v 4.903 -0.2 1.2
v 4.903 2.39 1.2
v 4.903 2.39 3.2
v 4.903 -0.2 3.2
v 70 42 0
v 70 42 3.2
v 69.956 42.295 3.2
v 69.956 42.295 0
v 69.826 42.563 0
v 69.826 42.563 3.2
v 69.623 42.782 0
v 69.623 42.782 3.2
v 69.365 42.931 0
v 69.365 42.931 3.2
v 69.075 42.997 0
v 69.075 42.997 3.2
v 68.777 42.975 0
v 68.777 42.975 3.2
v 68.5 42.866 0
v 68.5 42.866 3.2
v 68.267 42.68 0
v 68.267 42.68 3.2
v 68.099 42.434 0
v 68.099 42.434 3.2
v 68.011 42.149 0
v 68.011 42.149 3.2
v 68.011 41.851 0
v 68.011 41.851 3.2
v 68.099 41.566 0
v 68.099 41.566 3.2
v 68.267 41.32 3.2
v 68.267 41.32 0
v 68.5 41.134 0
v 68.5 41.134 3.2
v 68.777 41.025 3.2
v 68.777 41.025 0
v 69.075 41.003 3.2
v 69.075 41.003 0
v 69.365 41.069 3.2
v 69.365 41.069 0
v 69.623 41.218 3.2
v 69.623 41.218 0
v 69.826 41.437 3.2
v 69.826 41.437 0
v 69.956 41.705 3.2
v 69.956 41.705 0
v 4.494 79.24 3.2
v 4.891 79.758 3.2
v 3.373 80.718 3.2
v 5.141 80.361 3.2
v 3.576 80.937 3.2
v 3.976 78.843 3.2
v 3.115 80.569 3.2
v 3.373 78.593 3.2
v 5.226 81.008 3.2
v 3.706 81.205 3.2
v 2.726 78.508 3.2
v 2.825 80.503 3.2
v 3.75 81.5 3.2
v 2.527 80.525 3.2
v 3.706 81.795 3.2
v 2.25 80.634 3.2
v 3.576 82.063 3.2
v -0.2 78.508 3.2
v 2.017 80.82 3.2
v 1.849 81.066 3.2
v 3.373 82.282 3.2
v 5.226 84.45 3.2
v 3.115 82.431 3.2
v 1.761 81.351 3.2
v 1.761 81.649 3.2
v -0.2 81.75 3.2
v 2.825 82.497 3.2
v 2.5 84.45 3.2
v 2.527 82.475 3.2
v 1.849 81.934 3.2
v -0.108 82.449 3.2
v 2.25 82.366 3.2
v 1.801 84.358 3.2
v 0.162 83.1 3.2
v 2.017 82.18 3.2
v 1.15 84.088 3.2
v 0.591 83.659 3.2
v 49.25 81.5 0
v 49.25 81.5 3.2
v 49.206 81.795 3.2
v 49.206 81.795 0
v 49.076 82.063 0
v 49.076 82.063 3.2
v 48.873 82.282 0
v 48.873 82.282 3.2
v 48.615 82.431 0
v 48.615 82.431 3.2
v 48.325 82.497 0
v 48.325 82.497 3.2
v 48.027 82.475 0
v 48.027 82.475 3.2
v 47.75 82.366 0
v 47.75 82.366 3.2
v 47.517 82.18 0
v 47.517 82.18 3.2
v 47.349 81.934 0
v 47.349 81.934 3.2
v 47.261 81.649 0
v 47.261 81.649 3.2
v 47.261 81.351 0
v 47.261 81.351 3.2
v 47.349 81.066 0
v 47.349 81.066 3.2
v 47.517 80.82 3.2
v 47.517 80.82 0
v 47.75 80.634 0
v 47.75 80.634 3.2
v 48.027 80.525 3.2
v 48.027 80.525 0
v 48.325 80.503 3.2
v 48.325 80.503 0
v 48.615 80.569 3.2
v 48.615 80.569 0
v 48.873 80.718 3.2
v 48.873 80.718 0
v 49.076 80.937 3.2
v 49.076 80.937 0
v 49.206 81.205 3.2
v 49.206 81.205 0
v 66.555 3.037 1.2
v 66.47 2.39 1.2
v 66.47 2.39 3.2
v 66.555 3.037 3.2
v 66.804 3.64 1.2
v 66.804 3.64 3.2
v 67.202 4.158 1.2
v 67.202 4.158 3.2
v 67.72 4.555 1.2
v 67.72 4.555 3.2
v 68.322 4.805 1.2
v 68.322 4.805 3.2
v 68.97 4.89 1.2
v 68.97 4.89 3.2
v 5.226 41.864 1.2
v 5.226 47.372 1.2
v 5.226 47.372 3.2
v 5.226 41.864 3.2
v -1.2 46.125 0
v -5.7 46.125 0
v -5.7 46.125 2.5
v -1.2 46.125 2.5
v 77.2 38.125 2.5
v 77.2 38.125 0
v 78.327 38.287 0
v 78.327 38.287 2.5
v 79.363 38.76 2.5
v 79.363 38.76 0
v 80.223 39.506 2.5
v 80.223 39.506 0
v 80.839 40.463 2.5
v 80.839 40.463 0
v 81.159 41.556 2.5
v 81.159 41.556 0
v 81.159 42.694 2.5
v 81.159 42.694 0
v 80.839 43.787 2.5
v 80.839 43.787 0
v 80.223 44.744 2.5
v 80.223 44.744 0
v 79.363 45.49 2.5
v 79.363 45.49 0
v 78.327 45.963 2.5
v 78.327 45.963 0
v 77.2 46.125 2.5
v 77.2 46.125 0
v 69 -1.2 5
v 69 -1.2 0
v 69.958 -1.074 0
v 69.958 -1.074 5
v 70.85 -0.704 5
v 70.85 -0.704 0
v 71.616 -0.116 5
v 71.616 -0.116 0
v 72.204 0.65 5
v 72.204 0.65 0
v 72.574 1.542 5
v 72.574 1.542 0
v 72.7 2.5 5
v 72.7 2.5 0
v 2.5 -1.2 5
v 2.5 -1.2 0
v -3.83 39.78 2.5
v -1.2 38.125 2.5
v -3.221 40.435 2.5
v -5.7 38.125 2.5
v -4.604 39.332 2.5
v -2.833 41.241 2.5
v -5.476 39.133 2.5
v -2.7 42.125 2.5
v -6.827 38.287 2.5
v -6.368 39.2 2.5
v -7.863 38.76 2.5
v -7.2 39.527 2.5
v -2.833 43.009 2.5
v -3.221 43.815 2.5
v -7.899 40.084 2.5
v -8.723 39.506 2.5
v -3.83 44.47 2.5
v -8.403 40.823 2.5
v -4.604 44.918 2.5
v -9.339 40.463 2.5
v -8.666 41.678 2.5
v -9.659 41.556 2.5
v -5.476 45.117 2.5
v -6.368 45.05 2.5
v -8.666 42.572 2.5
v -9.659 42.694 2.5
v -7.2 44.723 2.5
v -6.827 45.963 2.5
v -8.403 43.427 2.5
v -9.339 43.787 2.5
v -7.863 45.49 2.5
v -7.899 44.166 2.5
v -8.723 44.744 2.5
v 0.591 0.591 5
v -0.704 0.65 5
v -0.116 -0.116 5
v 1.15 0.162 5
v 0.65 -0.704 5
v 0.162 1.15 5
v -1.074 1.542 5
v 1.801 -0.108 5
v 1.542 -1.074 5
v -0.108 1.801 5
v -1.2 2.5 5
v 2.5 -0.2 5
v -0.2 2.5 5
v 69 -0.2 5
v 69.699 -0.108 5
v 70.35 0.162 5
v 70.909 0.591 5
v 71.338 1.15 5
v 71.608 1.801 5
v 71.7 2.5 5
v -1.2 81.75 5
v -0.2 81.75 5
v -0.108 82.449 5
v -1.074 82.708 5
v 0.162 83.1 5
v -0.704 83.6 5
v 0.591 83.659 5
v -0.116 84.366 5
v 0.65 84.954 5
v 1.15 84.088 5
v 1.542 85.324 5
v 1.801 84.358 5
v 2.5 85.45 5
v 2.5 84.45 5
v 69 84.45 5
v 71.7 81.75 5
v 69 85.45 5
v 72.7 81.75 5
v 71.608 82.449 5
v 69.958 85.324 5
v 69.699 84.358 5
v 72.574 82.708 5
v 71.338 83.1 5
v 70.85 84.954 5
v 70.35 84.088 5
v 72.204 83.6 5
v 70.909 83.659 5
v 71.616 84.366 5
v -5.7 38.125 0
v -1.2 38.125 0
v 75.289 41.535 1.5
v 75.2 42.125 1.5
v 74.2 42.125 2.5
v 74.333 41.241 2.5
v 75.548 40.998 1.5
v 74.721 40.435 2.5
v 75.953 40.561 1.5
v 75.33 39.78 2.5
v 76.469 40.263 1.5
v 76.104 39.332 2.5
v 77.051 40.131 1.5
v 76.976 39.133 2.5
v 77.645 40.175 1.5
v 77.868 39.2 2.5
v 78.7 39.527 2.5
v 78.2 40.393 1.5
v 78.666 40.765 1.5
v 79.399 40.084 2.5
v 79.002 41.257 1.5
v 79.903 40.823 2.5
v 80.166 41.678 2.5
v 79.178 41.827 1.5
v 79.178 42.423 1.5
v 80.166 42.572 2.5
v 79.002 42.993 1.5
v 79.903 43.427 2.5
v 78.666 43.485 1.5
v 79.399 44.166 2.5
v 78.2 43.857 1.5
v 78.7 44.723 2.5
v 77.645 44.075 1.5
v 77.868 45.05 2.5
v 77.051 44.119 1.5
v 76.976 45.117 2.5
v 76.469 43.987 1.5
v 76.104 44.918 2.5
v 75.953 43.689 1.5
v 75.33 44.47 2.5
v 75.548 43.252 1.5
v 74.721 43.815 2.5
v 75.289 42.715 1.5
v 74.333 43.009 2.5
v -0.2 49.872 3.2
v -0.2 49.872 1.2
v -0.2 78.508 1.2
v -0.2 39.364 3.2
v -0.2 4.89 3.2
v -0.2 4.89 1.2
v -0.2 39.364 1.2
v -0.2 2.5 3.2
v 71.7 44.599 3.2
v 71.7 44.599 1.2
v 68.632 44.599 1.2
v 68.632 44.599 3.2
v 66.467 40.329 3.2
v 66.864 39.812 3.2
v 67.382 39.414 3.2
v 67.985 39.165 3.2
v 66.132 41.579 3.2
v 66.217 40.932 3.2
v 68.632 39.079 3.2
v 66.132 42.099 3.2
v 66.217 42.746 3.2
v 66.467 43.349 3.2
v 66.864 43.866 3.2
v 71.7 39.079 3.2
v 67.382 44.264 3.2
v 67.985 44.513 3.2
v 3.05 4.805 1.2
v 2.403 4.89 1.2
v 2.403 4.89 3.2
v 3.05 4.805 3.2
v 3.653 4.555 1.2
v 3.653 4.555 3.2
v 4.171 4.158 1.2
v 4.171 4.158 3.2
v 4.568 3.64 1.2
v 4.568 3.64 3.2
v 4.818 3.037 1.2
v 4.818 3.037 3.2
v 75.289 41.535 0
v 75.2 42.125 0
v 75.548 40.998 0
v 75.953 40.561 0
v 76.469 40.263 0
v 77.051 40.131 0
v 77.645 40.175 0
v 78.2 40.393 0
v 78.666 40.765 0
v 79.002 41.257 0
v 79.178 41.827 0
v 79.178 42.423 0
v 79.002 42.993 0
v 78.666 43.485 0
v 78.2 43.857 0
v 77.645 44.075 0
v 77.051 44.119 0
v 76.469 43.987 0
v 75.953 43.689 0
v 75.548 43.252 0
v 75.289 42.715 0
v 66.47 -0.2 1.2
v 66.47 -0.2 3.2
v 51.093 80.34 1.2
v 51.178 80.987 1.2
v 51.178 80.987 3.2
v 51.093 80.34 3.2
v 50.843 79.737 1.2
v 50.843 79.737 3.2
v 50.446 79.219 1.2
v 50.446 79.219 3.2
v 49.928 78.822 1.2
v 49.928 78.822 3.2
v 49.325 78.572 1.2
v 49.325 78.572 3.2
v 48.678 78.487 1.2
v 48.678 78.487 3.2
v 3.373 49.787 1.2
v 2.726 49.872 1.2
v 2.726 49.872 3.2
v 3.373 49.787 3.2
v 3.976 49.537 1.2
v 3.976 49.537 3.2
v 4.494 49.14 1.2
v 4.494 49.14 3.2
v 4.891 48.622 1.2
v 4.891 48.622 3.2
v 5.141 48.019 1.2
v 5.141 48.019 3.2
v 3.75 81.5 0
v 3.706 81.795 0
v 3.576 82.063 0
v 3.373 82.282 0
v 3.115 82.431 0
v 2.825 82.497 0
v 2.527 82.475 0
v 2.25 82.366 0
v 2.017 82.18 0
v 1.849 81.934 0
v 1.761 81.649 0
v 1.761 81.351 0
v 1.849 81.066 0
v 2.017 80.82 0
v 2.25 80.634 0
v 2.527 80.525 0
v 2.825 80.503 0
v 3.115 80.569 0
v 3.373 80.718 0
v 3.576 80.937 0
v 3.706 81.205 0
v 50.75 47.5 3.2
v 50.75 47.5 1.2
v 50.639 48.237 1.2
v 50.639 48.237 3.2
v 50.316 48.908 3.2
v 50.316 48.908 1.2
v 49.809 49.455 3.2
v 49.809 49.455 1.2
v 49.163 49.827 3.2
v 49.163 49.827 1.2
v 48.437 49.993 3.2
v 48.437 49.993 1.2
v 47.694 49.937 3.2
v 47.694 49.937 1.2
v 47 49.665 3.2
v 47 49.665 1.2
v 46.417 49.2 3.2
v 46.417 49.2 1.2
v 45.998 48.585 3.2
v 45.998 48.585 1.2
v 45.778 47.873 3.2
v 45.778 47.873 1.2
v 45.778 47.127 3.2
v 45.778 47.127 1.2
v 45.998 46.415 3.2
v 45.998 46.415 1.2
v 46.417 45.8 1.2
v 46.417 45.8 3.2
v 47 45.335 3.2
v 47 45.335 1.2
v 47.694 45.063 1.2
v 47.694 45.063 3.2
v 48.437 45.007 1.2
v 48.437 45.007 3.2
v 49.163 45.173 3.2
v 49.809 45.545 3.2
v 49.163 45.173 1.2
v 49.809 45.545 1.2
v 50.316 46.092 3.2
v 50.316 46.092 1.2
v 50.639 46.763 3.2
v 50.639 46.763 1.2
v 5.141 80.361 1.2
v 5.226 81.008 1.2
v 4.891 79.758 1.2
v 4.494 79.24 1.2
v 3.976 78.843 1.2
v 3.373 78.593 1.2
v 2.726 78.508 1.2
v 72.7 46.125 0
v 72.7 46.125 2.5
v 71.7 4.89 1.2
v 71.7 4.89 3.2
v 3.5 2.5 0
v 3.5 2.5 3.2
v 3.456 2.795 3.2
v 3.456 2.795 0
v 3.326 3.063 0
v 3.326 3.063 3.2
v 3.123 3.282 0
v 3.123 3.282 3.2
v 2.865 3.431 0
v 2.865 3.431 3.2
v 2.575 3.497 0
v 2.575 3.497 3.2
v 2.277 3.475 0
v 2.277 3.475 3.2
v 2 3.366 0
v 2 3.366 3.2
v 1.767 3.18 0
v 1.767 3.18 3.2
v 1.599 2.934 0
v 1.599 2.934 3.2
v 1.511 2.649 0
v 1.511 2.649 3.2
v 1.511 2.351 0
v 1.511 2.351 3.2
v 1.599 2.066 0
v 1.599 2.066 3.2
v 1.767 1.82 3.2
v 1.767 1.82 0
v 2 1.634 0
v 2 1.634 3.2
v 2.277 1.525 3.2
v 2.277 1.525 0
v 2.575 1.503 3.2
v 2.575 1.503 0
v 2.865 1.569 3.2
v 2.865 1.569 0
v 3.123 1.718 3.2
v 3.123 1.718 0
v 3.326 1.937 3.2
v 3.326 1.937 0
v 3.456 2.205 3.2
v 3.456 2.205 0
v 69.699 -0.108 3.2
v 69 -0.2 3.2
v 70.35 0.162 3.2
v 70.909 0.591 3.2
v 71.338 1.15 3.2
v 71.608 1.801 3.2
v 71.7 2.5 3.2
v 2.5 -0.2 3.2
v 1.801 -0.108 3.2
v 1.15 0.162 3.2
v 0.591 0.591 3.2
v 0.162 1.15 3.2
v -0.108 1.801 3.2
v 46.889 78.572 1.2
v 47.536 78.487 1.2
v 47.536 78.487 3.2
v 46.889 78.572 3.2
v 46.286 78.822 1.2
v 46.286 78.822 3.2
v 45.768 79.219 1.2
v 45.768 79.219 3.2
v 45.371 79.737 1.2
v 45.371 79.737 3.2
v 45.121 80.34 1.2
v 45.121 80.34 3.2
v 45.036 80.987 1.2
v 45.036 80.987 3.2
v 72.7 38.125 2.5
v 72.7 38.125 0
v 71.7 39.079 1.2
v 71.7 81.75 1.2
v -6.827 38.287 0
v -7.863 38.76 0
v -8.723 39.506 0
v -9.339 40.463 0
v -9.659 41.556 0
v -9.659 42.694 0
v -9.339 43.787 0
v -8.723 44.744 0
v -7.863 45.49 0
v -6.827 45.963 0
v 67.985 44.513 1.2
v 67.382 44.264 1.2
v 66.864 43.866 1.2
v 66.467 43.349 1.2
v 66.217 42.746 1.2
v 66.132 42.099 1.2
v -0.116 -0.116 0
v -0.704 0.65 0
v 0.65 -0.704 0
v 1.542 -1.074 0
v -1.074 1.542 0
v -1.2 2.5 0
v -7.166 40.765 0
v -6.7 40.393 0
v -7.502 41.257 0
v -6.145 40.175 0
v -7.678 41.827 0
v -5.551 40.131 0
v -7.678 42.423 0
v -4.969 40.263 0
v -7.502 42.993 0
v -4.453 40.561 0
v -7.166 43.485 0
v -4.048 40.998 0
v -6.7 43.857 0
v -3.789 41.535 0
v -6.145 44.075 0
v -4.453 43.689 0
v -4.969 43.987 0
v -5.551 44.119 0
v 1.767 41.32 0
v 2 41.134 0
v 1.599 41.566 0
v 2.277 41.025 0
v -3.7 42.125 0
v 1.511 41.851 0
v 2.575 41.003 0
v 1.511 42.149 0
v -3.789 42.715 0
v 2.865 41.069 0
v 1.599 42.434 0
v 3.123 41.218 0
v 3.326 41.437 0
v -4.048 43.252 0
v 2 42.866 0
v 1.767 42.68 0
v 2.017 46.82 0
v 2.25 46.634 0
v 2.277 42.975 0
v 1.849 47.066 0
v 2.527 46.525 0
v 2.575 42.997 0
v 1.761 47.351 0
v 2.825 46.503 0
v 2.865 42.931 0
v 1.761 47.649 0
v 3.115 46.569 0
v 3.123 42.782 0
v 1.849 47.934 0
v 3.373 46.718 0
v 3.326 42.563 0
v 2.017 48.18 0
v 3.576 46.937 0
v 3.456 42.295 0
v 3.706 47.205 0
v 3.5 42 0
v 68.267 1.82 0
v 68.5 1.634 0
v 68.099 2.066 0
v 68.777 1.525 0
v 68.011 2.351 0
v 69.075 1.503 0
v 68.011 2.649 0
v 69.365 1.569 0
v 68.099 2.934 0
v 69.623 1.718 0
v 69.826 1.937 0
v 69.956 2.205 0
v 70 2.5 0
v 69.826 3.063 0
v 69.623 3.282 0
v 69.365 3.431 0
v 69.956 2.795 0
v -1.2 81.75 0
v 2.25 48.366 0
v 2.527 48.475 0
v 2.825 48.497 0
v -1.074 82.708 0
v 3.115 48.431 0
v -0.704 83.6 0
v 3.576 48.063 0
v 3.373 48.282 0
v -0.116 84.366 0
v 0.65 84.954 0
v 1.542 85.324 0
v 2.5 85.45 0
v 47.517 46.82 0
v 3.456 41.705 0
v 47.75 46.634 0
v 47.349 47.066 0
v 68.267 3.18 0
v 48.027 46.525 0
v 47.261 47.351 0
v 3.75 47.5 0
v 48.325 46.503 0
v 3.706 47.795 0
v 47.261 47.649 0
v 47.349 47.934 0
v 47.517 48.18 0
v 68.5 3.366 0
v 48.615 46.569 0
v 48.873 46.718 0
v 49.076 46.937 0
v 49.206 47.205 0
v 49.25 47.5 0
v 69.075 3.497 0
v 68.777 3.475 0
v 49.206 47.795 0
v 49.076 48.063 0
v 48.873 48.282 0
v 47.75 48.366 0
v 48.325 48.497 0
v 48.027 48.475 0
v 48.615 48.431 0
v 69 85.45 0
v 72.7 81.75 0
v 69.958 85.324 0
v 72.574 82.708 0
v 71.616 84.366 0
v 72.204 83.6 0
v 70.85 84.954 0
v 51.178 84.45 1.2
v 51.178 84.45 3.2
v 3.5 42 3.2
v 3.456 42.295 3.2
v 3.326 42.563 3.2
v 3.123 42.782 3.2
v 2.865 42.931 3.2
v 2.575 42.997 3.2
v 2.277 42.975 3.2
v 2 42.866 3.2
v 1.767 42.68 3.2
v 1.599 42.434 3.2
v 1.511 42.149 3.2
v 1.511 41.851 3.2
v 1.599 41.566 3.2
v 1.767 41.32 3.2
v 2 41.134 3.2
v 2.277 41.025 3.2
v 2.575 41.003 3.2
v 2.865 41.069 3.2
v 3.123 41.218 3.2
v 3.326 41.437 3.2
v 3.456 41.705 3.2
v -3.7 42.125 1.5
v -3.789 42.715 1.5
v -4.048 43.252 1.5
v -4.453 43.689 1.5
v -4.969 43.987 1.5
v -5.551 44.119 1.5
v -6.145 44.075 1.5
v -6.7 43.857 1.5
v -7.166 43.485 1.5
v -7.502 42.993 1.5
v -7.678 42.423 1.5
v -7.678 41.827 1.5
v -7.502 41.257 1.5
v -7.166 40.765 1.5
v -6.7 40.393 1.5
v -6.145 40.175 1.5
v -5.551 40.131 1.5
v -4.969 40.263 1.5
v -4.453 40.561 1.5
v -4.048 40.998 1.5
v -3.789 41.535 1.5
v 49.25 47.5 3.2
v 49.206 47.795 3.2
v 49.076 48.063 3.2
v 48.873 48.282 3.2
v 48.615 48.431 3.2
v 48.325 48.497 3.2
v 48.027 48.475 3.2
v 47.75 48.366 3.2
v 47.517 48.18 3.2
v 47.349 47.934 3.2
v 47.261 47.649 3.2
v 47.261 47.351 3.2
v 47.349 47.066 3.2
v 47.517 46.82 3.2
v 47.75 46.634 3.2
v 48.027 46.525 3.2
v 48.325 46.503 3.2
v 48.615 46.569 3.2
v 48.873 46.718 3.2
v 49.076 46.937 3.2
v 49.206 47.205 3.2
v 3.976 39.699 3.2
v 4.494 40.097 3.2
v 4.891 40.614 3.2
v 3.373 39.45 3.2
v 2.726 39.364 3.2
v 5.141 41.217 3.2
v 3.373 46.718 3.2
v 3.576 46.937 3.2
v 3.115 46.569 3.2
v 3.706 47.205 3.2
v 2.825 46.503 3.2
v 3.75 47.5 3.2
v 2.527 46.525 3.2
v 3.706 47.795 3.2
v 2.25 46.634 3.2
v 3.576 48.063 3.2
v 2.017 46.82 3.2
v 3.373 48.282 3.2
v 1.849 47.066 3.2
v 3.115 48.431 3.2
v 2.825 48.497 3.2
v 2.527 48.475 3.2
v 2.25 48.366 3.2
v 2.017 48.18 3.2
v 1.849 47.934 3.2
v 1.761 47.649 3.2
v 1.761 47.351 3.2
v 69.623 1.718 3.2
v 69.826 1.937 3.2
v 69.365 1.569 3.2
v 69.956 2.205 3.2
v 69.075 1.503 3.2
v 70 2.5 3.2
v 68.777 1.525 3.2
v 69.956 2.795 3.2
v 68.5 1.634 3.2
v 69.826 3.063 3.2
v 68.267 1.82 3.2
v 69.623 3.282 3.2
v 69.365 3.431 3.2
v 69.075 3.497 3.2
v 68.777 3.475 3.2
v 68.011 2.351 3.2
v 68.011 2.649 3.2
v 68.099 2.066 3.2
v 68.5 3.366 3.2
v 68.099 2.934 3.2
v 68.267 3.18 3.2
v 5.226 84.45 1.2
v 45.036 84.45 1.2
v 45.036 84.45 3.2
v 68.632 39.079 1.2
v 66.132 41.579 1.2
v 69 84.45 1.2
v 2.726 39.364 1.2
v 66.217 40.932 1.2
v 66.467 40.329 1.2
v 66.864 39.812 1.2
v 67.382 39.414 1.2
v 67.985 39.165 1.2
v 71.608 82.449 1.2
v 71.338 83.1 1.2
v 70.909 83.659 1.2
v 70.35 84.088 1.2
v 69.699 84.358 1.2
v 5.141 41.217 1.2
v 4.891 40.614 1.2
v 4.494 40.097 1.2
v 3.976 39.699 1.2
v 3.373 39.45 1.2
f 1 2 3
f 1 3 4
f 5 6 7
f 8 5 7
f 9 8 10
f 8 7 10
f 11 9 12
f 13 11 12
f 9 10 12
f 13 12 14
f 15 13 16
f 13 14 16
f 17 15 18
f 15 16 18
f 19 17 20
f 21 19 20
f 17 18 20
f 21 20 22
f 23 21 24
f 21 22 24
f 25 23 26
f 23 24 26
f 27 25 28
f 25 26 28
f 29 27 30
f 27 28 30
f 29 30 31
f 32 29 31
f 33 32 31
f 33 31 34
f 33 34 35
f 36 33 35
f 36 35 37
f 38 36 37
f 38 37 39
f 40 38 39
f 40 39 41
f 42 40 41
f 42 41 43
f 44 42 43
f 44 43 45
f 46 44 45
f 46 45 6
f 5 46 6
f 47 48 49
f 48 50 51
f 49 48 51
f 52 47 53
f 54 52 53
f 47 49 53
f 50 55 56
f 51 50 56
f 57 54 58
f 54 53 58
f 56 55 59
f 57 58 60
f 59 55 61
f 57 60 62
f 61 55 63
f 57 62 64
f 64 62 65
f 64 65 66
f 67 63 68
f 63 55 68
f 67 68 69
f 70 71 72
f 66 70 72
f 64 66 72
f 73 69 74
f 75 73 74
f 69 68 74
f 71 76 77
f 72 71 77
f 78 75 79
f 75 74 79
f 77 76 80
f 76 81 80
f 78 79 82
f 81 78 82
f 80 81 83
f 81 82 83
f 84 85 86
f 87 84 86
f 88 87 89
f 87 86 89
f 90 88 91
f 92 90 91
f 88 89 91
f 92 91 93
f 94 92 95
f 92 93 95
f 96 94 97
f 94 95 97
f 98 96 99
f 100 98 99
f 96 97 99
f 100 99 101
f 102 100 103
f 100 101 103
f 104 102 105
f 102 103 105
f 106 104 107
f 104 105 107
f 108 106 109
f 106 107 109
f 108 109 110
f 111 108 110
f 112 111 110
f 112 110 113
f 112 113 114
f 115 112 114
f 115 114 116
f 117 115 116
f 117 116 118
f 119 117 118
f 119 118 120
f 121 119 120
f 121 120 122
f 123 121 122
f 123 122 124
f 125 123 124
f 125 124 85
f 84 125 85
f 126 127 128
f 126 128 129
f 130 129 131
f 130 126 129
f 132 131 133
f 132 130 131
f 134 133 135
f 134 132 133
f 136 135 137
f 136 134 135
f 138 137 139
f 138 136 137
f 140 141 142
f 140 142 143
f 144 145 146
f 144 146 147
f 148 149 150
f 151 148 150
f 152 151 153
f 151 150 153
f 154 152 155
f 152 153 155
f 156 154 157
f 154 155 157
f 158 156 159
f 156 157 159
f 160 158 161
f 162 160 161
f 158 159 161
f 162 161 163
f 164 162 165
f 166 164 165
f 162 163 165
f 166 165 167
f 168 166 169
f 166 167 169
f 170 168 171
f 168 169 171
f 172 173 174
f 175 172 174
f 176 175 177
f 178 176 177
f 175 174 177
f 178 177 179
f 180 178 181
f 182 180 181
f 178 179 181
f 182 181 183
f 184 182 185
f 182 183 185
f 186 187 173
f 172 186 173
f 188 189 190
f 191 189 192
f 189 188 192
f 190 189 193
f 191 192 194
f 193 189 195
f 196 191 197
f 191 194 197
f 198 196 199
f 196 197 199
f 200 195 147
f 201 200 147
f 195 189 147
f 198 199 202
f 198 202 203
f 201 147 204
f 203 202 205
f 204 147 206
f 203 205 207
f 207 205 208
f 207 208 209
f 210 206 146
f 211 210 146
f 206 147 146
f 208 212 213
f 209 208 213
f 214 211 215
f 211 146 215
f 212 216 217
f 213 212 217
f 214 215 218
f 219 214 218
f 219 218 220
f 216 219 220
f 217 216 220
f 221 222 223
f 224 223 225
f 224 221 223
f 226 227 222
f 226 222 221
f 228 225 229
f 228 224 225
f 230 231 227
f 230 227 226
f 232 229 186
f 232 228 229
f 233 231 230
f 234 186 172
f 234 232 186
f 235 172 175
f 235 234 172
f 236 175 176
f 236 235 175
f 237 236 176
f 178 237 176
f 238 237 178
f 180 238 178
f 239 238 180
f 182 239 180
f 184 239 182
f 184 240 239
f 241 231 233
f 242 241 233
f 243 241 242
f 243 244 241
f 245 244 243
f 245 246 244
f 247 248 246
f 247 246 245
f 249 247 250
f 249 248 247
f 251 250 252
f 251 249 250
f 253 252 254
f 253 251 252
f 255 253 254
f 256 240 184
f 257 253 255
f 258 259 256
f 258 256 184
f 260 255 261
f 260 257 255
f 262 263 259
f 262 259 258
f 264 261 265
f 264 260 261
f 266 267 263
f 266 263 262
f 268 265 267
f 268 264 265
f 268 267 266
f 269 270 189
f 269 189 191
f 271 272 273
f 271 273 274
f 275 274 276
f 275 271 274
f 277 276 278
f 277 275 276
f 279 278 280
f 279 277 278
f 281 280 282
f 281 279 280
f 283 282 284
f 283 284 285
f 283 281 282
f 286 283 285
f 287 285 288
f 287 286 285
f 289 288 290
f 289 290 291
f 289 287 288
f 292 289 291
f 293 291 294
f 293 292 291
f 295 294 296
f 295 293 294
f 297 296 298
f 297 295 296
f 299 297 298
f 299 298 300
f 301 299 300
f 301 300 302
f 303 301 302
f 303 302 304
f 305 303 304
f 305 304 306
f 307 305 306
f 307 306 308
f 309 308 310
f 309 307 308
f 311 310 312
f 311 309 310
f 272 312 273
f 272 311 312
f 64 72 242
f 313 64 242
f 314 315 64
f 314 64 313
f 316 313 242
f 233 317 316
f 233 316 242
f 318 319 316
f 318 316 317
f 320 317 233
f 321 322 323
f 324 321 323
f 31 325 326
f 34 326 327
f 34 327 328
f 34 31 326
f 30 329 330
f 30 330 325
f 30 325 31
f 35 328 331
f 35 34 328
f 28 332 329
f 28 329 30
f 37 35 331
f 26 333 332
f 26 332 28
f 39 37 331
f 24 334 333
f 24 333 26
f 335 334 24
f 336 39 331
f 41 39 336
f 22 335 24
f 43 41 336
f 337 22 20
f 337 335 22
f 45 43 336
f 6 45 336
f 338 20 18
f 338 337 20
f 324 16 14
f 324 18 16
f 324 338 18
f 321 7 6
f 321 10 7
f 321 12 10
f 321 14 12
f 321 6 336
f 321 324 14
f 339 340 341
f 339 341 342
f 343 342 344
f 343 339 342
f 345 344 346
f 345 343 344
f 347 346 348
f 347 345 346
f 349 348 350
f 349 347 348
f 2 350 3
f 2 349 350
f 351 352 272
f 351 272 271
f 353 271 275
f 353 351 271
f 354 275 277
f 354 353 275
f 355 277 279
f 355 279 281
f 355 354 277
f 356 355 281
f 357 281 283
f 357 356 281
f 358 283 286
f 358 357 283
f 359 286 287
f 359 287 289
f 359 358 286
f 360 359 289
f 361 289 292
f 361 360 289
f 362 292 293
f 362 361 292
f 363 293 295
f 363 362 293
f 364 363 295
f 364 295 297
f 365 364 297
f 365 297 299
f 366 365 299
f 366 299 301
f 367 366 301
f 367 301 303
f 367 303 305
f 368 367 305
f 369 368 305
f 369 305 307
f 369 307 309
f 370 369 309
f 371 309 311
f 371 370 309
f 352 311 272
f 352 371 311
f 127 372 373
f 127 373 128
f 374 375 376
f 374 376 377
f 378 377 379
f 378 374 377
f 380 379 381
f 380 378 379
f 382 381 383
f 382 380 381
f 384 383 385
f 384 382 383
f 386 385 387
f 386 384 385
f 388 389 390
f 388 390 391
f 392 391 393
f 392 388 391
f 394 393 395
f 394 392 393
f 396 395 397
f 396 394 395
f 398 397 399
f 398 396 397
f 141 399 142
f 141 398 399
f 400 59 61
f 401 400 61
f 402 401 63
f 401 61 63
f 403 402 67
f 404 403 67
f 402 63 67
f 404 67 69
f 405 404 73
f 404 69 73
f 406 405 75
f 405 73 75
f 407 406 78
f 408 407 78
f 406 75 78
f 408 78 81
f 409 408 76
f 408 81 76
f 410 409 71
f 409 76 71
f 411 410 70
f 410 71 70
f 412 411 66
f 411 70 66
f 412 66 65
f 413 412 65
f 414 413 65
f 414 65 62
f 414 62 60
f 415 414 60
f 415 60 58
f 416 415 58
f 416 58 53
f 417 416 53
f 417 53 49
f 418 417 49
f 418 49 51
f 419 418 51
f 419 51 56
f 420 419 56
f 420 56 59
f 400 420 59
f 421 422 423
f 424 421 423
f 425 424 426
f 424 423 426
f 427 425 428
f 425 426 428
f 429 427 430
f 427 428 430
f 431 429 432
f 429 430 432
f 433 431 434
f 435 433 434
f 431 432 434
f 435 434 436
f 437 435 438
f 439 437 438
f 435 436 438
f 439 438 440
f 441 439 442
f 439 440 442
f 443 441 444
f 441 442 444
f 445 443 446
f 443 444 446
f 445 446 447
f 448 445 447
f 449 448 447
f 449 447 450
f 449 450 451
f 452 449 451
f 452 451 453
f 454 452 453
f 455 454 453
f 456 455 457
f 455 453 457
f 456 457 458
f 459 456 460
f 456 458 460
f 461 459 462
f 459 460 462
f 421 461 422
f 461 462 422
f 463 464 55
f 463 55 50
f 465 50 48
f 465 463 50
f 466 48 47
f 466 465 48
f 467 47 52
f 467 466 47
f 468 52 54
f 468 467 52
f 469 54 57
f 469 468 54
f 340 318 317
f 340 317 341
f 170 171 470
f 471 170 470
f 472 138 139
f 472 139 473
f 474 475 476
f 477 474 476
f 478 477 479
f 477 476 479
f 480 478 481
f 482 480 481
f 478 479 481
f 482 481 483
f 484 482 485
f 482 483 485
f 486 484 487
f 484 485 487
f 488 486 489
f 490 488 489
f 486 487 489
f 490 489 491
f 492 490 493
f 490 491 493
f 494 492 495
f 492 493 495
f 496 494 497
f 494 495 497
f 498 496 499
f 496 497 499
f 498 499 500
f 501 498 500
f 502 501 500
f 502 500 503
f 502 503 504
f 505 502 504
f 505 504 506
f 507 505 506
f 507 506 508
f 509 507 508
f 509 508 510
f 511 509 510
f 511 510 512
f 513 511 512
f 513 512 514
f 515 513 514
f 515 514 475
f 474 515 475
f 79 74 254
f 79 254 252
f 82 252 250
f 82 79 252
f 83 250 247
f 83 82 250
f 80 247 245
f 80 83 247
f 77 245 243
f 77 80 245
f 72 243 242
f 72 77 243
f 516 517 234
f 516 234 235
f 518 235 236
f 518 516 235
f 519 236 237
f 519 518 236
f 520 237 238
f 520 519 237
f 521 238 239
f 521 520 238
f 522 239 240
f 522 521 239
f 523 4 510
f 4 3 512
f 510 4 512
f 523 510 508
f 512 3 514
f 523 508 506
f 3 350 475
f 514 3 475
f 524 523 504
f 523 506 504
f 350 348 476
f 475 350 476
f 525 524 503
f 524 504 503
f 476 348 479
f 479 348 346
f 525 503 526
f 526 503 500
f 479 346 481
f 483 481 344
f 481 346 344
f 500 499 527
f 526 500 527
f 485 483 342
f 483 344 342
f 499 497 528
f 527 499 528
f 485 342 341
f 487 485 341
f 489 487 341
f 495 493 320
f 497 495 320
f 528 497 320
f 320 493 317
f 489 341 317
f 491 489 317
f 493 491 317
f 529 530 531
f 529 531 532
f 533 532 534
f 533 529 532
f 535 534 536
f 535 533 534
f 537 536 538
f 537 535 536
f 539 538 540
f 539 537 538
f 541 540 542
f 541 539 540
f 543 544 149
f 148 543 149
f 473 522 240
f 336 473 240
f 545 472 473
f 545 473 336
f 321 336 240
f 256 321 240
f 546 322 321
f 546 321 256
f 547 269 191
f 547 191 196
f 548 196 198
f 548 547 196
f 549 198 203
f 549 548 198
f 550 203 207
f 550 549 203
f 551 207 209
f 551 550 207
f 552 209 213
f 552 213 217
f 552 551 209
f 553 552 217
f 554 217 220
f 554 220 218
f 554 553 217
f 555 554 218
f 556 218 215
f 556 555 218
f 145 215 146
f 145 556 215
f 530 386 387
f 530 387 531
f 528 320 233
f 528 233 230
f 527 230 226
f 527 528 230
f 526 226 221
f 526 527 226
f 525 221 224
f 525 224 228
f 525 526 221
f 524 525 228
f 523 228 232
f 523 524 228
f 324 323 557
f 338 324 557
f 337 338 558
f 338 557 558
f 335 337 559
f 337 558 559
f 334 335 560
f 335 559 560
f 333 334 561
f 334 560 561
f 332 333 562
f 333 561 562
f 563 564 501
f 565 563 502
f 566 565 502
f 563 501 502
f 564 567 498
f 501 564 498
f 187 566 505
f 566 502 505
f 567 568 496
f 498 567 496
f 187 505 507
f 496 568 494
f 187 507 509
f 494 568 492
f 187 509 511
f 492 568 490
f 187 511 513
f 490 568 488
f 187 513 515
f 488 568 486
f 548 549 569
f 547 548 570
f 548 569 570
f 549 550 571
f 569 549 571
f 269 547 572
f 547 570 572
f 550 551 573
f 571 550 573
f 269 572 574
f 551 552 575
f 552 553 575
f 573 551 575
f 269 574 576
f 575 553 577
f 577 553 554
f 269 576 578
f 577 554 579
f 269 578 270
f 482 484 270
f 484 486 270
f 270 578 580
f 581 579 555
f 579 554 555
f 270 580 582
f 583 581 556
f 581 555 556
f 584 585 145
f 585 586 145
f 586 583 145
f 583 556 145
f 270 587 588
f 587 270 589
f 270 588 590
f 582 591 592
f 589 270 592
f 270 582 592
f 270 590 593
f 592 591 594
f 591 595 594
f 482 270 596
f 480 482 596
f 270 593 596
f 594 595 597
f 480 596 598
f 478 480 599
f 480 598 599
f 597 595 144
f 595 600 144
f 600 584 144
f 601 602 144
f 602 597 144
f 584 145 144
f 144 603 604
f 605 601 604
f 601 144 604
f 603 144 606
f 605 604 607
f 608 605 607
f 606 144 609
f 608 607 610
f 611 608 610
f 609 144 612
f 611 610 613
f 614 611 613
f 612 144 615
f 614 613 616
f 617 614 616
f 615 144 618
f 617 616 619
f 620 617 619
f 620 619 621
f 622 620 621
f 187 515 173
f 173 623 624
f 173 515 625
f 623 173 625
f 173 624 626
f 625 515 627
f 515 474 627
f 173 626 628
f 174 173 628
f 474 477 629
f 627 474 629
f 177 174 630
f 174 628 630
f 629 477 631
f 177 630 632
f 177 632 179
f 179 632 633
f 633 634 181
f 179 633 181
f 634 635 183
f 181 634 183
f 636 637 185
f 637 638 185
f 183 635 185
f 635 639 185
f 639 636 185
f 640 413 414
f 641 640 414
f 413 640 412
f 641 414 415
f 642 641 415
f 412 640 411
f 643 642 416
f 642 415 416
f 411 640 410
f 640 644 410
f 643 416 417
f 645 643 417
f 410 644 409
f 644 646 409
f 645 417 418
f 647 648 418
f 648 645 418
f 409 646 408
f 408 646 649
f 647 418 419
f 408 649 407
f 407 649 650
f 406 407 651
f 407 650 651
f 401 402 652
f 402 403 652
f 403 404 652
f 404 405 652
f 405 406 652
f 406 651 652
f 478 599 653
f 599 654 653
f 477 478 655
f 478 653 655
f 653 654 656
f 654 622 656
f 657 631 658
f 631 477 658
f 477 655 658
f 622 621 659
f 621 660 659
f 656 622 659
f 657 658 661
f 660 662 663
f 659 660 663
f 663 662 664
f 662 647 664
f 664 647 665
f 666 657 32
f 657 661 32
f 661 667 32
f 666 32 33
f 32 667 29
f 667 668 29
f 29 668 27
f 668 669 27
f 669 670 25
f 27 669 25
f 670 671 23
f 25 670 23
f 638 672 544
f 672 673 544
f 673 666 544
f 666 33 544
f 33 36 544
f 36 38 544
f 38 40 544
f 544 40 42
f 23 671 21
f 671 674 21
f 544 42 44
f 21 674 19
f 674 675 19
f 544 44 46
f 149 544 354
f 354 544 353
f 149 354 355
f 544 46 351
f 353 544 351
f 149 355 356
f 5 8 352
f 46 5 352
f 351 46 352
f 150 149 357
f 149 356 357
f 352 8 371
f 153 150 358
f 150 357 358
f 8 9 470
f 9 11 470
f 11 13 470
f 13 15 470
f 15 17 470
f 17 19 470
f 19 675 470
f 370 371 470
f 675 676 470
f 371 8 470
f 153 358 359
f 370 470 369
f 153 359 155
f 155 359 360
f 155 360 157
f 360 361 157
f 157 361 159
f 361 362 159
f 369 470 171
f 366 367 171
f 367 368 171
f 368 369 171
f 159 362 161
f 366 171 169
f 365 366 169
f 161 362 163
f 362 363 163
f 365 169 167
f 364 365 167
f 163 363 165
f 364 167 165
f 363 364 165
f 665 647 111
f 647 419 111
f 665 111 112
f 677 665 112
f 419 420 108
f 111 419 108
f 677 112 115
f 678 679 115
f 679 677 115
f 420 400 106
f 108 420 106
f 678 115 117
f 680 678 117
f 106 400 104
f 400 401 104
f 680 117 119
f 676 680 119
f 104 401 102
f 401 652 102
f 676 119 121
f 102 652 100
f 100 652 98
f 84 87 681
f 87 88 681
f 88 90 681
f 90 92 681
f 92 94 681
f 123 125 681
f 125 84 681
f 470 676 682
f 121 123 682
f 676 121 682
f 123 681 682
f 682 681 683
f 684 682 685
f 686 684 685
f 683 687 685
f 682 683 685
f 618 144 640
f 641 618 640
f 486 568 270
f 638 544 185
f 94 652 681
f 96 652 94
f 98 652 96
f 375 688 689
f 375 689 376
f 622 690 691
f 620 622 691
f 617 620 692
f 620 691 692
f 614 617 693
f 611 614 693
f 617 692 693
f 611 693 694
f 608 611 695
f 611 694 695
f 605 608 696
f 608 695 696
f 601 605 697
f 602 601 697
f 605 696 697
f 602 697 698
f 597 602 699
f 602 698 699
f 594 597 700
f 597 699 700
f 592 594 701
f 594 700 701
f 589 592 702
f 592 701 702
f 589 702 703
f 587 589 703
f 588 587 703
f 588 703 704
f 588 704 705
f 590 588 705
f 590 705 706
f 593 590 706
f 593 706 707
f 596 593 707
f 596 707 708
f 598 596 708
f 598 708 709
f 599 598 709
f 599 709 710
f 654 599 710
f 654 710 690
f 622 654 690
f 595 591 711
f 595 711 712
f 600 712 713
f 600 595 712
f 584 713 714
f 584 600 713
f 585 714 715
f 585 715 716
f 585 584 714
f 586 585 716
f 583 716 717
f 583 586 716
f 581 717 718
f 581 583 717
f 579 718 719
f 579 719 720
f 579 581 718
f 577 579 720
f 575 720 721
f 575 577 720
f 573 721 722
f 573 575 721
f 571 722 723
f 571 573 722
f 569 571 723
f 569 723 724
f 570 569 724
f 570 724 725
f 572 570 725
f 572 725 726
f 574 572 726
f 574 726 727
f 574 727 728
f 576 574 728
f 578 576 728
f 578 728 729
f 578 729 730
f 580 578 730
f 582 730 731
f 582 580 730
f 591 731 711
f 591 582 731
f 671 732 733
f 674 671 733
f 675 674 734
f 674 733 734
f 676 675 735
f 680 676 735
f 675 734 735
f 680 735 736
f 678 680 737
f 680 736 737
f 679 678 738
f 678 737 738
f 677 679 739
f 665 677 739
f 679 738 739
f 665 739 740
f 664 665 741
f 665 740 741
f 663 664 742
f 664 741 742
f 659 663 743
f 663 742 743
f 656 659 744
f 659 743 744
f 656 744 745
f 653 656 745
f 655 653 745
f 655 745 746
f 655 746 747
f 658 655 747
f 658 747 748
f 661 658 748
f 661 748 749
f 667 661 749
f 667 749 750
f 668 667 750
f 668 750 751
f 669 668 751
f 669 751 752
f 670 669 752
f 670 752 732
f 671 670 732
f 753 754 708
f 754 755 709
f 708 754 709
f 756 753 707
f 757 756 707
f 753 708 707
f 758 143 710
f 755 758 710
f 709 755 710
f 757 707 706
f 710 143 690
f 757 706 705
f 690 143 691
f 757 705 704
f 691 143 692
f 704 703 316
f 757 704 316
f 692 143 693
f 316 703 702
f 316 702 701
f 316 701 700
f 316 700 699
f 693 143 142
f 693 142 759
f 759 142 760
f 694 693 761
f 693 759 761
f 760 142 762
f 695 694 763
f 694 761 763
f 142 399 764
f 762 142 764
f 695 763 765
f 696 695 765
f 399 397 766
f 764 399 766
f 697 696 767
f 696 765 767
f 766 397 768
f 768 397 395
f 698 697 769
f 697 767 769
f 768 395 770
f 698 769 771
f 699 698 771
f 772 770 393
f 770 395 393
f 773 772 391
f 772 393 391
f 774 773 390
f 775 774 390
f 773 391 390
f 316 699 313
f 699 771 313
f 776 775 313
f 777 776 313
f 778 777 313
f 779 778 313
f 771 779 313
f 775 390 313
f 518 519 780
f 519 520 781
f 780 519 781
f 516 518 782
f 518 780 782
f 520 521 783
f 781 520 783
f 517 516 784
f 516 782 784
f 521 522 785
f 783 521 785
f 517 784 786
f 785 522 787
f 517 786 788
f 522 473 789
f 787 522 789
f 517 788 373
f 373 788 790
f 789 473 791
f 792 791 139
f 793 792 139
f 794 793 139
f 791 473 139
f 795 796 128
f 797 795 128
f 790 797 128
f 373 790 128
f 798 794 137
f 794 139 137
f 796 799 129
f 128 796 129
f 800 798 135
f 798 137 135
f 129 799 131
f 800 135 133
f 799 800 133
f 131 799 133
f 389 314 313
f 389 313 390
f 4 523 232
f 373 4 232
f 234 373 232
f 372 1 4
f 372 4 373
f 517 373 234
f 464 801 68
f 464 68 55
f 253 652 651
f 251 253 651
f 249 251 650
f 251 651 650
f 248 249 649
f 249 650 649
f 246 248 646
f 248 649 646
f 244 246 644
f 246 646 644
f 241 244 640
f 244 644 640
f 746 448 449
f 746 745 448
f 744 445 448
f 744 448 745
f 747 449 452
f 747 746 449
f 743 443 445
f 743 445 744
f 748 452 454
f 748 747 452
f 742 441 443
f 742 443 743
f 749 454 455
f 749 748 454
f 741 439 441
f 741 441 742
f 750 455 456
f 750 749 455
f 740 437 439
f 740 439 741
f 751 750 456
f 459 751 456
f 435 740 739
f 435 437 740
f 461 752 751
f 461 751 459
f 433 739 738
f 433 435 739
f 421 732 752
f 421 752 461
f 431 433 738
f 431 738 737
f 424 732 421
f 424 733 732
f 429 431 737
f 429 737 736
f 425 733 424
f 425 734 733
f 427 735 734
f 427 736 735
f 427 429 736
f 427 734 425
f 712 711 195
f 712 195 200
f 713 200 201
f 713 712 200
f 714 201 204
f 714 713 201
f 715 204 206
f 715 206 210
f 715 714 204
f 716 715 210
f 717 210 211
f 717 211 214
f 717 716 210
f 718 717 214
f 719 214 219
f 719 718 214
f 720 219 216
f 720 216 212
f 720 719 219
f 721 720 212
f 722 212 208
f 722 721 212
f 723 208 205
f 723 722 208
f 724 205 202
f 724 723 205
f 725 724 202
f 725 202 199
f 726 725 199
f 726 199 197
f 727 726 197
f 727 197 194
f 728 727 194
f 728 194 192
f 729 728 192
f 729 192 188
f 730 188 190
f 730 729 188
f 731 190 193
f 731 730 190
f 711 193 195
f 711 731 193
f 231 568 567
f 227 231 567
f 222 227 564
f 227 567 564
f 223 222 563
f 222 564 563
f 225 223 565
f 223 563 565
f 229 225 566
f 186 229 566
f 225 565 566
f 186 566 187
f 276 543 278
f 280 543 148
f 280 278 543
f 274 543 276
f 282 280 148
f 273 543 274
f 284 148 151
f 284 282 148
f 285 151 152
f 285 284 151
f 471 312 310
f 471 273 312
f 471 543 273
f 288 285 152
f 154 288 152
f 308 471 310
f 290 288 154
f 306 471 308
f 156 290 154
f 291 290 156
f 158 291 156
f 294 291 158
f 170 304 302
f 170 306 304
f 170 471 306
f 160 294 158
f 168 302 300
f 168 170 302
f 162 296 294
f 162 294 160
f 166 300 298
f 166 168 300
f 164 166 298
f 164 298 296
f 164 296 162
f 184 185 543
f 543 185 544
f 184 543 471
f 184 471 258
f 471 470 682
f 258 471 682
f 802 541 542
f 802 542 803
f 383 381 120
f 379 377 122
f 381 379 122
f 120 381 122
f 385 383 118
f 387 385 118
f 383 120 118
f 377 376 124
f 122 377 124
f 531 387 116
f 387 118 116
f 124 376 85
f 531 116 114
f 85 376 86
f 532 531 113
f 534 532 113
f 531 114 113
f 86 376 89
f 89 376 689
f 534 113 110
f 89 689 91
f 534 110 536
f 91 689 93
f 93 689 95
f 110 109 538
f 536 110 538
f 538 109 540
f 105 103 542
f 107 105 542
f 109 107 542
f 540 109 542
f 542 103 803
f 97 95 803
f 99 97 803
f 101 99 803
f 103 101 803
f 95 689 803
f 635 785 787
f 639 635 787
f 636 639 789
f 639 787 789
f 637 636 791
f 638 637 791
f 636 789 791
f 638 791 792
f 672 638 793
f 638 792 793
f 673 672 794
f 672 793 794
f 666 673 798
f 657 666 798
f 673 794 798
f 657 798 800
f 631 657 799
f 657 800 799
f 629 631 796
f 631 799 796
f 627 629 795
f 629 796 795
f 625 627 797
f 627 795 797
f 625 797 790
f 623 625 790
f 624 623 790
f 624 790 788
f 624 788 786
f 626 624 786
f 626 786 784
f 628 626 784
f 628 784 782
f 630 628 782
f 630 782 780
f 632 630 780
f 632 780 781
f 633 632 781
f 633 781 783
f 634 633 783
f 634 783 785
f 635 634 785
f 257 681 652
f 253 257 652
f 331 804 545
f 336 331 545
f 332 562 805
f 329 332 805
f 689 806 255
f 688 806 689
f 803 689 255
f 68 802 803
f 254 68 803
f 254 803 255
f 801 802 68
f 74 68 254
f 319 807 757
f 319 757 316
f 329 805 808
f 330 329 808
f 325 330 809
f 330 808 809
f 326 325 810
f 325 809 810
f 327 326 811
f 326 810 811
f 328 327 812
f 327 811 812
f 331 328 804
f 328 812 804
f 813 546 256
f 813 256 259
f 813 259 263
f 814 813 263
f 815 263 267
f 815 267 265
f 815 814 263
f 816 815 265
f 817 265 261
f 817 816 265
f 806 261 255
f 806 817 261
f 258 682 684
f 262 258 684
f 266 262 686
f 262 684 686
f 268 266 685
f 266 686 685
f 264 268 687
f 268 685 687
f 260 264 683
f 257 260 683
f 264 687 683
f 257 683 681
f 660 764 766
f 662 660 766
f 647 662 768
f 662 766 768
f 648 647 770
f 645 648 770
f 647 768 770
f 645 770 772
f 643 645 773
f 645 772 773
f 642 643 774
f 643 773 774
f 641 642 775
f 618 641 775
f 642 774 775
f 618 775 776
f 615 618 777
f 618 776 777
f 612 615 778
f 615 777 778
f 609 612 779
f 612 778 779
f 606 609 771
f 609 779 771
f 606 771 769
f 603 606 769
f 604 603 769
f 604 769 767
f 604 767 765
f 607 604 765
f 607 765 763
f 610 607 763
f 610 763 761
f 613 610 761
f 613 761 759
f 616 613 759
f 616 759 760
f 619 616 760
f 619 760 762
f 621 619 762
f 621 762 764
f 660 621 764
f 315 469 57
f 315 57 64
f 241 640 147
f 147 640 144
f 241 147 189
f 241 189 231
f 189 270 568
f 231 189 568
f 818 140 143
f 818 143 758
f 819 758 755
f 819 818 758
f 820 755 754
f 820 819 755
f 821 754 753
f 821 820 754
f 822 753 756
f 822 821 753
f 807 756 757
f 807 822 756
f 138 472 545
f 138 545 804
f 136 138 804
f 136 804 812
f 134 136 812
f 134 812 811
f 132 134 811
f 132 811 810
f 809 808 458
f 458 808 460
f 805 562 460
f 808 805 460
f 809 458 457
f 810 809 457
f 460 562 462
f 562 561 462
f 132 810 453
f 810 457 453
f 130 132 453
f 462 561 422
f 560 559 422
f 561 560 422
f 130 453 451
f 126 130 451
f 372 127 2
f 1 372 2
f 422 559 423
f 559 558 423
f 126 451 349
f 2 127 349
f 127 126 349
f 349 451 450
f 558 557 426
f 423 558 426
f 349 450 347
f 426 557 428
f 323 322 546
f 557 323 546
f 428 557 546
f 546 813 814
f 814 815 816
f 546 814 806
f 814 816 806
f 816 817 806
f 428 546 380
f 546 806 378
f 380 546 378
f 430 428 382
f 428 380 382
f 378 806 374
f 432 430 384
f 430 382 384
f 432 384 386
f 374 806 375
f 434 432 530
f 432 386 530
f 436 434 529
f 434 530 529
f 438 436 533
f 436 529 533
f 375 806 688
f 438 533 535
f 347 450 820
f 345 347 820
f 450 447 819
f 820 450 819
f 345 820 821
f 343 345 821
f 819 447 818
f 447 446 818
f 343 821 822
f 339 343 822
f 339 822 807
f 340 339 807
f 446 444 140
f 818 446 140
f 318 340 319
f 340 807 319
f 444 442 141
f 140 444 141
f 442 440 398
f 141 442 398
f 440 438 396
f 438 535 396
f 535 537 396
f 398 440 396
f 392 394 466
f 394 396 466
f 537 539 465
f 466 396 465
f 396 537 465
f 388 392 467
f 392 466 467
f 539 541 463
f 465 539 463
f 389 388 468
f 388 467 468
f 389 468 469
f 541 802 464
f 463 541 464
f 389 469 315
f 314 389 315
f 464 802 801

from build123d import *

# Parameters (mm, degrees)
EXTRUDE_1_DEPTH     = 1.2
EXTRUDE_2_DEPTH     = 5
SKETCH_6_R          = 2.5
EXTRUDE_3_DEPTH     = 2
SKETCH_7_R          = 1
CUT_EXTRUDE_1_DEPTH = 113.237393177
SKETCH_8_R          = 2
EXTRUDE_4_DEPTH     = 2.5
CHAMFER_1_SIZE      = 1


with BuildPart() as part:
    # Эскиз4 → Бобышка-Вытянуть1 (new body)
    with BuildSketch(Plane.XY):
        with BuildLine():
            Line((71.69999924, 81.74999906), (71.70000051, 2.500002823))
            ThreePointArc((71.70000051, 2.500002823), (70.909189394, 0.590811786), (68.99999916, -0.20000127))
            Line((68.99999916, -0.20000127), (2.50000008, -0.20000127))
            ThreePointArc((2.50000008, -0.20000127), (0.590809846, 0.590811786), (-0.20000127, 2.500002823))
            Line((-0.20000127, 2.500002823), (-0.2, 81.74999906))
            ThreePointArc((-0.2, 81.74999906), (0.590811714, 83.659187426), (2.50000008, 84.44999914))
            Line((2.50000008, 84.44999914), (68.99999916, 84.44999914))
            ThreePointArc((68.99999916, 84.44999914), (70.909187526, 83.659187426), (71.69999924, 81.74999906))
        make_face()
    extrude(amount=EXTRUDE_1_DEPTH)

    # Эскиз5 → Бобышка-Вытянуть2 (add)
    with BuildSketch(Plane.XY):
        with BuildLine():
            Line((-1.2, 81.74999906), (-1.20000127, 2.500002839))
            ThreePointArc((-1.20000127, 2.500002839), (-0.116296941, -0.116294989), (2.50000008, -1.20000127))
            Line((2.50000008, -1.20000127), (68.99999916, -1.20000127))
            ThreePointArc((68.99999916, -1.20000127), (71.616296534, -0.116294636), (72.70000051, 2.500003839))
            Line((72.70000051, 2.500003839), (72.69999924, 81.749999076))
            ThreePointArc((72.69999924, 81.749999076), (71.616294301, 84.366294213), (68.99999916, 85.44999914))
            Line((68.99999916, 85.44999914), (2.50000008, 85.44999914))
            ThreePointArc((2.50000008, 85.44999914), (-0.116295067, 84.366294207), (-1.2, 81.74999906))
        make_face()
        with BuildLine():
            Line((-0.2, 81.74999906), (-0.20000127, 2.500002823))
            ThreePointArc((-0.20000127, 2.500002823), (0.590809846, 0.590811786), (2.50000008, -0.20000127))
            Line((2.50000008, -0.20000127), (68.99999916, -0.20000127))
            ThreePointArc((68.99999916, -0.20000127), (70.909189394, 0.590811786), (71.70000051, 2.500002823))
            Line((71.70000051, 2.500002823), (71.69999924, 81.74999906))
            ThreePointArc((71.69999924, 81.74999906), (70.909187526, 83.659187426), (68.99999916, 84.44999914))
            Line((68.99999916, 84.44999914), (2.50000008, 84.44999914))
            ThreePointArc((2.50000008, 84.44999914), (0.590811714, 83.659187426), (-0.2, 81.74999906))
        make_face(mode=Mode.SUBTRACT)
    extrude(amount=EXTRUDE_2_DEPTH)

    # Эскиз6 → Бобышка-Вытянуть3 (add)
    with BuildSketch(Plane.XY.offset(1.2)):
        with Locations((48.25000002, 47.49999898)):
            Circle(SKETCH_6_R)
        with BuildLine():
            Line((2.50000008, 84.44999914), (5.226059178, 84.44999914))
            Line((5.226059178, 84.44999914), (5.226059178, 81.007828318))
            ThreePointArc((5.226059178, 81.007828318), (4.493826131, 79.240061365), (2.726059178, 78.507828318))
            Line((2.726059178, 78.507828318), (-0.200000052, 78.507828318))
            Line((-0.200000052, 78.507828318), (-0.2, 81.74999906))
            ThreePointArc((-0.2, 81.74999906), (0.590811714, 83.659187426), (2.50000008, 84.44999914))
        make_face()
        with BuildLine():
            Line((-0.20000127, 2.500002823), (-0.200001232, 4.890114712))
            Line((-0.200001232, 4.890114712), (2.403331994, 4.890114712))
            ThreePointArc((2.403331994, 4.890114712), (4.171098947, 4.157881665), (4.903331994, 2.390114712))
            Line((4.903331994, 2.390114712), (4.903331994, -0.20000127))
            Line((4.903331994, -0.20000127), (2.50000008, -0.20000127))
            ThreePointArc((2.50000008, -0.20000127), (0.590809846, 0.590811786), (-0.20000127, 2.500002823))
        make_face()
        with BuildLine():
            Line((-0.200000511, 49.872119205), (2.726059178, 49.872119205))
            ThreePointArc((2.726059178, 49.872119205), (4.493826131, 49.139886157), (5.226059178, 47.372119205))
            Line((5.226059178, 47.372119205), (5.226059178, 41.864390239))
            ThreePointArc((5.226059178, 41.864390239), (4.493826131, 40.096623286), (2.726059178, 39.364390239))
            Line((2.726059178, 39.364390239), (-0.200000511, 39.364390239))
            Line((-0.200000511, 39.364390239), (-0.200000511, 49.872119205))
        make_face()
        with BuildLine():
            Line((68.99999916, -0.20000127), (66.469541981, -0.20000127))
            Line((66.469541981, -0.20000127), (66.469541981, 2.390114712))
            ThreePointArc((66.469541981, 2.390114712), (67.201775029, 4.157881665), (68.969541981, 4.890114712))
            Line((68.969541981, 4.890114712), (71.700000472, 4.890114712))
            Line((71.700000472, 4.890114712), (71.70000051, 2.500002823))
            ThreePointArc((71.70000051, 2.500002823), (70.909189394, 0.590811786), (68.99999916, -0.20000127))
        make_face()
        with BuildLine():
            Line((45.035976698, 84.44999914), (51.177915607, 84.44999914))
            Line((51.177915607, 84.44999914), (51.177915607, 80.986834439))
            ThreePointArc((51.177915607, 80.986834439), (50.44568256, 79.219067486), (48.677915607, 78.486834439))
            Line((48.677915607, 78.486834439), (47.535976698, 78.486834439))
            ThreePointArc((47.535976698, 78.486834439), (45.768209745, 79.219067486), (45.035976698, 80.986834439))
            Line((45.035976698, 80.986834439), (45.035976698, 84.44999914))
        make_face()
        with BuildLine():
            Line((71.699999835, 44.598653312), (68.631763305, 44.598653312))
            ThreePointArc((68.631763305, 44.598653312), (66.863996352, 43.866420264), (66.131763305, 42.098653312))
            Line((66.131763305, 42.098653312), (66.131763305, 41.579341714))
            ThreePointArc((66.131763305, 41.579341714), (66.863996352, 39.811574761), (68.631763305, 39.079341714))
            Line((68.631763305, 39.079341714), (71.699999835, 39.079341714))
            Line((71.699999835, 39.079341714), (71.699999835, 44.598653312))
        make_face()
    extrude(amount=EXTRUDE_3_DEPTH)

    # Эскиз7 → Вырез-Вытянуть1 (cut, through all)
    with BuildSketch(Plane.XY.offset(3.2)):
        with Locations((2.74999958, 81.49999956)):
            Circle(SKETCH_7_R)
        with Locations((48.25000002, 81.49999956)):
            Circle(SKETCH_7_R)
        with Locations((48.25000002, 47.49999898)):
            Circle(SKETCH_7_R)
        with Locations((68.99999916, 41.99999982)):
            Circle(SKETCH_7_R)
        with Locations((2.74999958, 47.49999898)):
            Circle(SKETCH_7_R)
        with Locations((2.50000008, 41.99999982)):
            Circle(SKETCH_7_R)
        with Locations((2.50000008, 2.50000008)):
            Circle(SKETCH_7_R)
        with Locations((68.99999916, 2.50000008)):
            Circle(SKETCH_7_R)
    extrude(amount=-CUT_EXTRUDE_1_DEPTH, mode=Mode.SUBTRACT)

    # Эскиз8 → Бобышка-Вытянуть4 (add)
    # profile 1 of 2: a face of its own
    with BuildSketch(Plane.XY):
        with BuildLine():
            Line((-5.700000635, 46.12500095), (-1.200000571, 46.12500095))
            Line((-1.200000571, 46.12500095), (-1.200000699, 38.12500095))
            Line((-1.200000699, 38.12500095), (-5.700000635, 38.12500095))
            ThreePointArc((-5.700000635, 38.12500095), (-9.700000635, 42.12500095), (-5.700000635, 46.12500095))
        make_face()
        with Locations((-5.700000635, 42.12500095)):
            Circle(SKETCH_8_R, mode=Mode.SUBTRACT)
    # profile 2 of 2: a face of its own
    with BuildSketch(Plane.XY):
        with BuildLine():
            Line((72.699999939, 38.12500095), (77.199999875, 38.12500095))
            ThreePointArc((77.199999875, 38.12500095), (81.199999875, 42.12500095), (77.199999875, 46.12500095))
            Line((77.199999875, 46.12500095), (72.699999811, 46.12500095))
            Line((72.699999811, 46.12500095), (72.699999939, 38.12500095))
        make_face()
        with Locations(Location((77.199999875, 42.12500095, 0), (0, 0, 180))):
            Circle(SKETCH_8_R, mode=Mode.SUBTRACT)
    extrude(amount=EXTRUDE_4_DEPTH)

    # Фаска1
    chamfer_1_edges = [part.edges().sort_by_distance(p)[0] for p in [
        (-7.700000635, 42.12500095, 2.5),
        (79.199999875, 42.12500095, 2.5),
    ]]
    chamfer(chamfer_1_edges, length=CHAMFER_1_SIZE)


solid = part.part
